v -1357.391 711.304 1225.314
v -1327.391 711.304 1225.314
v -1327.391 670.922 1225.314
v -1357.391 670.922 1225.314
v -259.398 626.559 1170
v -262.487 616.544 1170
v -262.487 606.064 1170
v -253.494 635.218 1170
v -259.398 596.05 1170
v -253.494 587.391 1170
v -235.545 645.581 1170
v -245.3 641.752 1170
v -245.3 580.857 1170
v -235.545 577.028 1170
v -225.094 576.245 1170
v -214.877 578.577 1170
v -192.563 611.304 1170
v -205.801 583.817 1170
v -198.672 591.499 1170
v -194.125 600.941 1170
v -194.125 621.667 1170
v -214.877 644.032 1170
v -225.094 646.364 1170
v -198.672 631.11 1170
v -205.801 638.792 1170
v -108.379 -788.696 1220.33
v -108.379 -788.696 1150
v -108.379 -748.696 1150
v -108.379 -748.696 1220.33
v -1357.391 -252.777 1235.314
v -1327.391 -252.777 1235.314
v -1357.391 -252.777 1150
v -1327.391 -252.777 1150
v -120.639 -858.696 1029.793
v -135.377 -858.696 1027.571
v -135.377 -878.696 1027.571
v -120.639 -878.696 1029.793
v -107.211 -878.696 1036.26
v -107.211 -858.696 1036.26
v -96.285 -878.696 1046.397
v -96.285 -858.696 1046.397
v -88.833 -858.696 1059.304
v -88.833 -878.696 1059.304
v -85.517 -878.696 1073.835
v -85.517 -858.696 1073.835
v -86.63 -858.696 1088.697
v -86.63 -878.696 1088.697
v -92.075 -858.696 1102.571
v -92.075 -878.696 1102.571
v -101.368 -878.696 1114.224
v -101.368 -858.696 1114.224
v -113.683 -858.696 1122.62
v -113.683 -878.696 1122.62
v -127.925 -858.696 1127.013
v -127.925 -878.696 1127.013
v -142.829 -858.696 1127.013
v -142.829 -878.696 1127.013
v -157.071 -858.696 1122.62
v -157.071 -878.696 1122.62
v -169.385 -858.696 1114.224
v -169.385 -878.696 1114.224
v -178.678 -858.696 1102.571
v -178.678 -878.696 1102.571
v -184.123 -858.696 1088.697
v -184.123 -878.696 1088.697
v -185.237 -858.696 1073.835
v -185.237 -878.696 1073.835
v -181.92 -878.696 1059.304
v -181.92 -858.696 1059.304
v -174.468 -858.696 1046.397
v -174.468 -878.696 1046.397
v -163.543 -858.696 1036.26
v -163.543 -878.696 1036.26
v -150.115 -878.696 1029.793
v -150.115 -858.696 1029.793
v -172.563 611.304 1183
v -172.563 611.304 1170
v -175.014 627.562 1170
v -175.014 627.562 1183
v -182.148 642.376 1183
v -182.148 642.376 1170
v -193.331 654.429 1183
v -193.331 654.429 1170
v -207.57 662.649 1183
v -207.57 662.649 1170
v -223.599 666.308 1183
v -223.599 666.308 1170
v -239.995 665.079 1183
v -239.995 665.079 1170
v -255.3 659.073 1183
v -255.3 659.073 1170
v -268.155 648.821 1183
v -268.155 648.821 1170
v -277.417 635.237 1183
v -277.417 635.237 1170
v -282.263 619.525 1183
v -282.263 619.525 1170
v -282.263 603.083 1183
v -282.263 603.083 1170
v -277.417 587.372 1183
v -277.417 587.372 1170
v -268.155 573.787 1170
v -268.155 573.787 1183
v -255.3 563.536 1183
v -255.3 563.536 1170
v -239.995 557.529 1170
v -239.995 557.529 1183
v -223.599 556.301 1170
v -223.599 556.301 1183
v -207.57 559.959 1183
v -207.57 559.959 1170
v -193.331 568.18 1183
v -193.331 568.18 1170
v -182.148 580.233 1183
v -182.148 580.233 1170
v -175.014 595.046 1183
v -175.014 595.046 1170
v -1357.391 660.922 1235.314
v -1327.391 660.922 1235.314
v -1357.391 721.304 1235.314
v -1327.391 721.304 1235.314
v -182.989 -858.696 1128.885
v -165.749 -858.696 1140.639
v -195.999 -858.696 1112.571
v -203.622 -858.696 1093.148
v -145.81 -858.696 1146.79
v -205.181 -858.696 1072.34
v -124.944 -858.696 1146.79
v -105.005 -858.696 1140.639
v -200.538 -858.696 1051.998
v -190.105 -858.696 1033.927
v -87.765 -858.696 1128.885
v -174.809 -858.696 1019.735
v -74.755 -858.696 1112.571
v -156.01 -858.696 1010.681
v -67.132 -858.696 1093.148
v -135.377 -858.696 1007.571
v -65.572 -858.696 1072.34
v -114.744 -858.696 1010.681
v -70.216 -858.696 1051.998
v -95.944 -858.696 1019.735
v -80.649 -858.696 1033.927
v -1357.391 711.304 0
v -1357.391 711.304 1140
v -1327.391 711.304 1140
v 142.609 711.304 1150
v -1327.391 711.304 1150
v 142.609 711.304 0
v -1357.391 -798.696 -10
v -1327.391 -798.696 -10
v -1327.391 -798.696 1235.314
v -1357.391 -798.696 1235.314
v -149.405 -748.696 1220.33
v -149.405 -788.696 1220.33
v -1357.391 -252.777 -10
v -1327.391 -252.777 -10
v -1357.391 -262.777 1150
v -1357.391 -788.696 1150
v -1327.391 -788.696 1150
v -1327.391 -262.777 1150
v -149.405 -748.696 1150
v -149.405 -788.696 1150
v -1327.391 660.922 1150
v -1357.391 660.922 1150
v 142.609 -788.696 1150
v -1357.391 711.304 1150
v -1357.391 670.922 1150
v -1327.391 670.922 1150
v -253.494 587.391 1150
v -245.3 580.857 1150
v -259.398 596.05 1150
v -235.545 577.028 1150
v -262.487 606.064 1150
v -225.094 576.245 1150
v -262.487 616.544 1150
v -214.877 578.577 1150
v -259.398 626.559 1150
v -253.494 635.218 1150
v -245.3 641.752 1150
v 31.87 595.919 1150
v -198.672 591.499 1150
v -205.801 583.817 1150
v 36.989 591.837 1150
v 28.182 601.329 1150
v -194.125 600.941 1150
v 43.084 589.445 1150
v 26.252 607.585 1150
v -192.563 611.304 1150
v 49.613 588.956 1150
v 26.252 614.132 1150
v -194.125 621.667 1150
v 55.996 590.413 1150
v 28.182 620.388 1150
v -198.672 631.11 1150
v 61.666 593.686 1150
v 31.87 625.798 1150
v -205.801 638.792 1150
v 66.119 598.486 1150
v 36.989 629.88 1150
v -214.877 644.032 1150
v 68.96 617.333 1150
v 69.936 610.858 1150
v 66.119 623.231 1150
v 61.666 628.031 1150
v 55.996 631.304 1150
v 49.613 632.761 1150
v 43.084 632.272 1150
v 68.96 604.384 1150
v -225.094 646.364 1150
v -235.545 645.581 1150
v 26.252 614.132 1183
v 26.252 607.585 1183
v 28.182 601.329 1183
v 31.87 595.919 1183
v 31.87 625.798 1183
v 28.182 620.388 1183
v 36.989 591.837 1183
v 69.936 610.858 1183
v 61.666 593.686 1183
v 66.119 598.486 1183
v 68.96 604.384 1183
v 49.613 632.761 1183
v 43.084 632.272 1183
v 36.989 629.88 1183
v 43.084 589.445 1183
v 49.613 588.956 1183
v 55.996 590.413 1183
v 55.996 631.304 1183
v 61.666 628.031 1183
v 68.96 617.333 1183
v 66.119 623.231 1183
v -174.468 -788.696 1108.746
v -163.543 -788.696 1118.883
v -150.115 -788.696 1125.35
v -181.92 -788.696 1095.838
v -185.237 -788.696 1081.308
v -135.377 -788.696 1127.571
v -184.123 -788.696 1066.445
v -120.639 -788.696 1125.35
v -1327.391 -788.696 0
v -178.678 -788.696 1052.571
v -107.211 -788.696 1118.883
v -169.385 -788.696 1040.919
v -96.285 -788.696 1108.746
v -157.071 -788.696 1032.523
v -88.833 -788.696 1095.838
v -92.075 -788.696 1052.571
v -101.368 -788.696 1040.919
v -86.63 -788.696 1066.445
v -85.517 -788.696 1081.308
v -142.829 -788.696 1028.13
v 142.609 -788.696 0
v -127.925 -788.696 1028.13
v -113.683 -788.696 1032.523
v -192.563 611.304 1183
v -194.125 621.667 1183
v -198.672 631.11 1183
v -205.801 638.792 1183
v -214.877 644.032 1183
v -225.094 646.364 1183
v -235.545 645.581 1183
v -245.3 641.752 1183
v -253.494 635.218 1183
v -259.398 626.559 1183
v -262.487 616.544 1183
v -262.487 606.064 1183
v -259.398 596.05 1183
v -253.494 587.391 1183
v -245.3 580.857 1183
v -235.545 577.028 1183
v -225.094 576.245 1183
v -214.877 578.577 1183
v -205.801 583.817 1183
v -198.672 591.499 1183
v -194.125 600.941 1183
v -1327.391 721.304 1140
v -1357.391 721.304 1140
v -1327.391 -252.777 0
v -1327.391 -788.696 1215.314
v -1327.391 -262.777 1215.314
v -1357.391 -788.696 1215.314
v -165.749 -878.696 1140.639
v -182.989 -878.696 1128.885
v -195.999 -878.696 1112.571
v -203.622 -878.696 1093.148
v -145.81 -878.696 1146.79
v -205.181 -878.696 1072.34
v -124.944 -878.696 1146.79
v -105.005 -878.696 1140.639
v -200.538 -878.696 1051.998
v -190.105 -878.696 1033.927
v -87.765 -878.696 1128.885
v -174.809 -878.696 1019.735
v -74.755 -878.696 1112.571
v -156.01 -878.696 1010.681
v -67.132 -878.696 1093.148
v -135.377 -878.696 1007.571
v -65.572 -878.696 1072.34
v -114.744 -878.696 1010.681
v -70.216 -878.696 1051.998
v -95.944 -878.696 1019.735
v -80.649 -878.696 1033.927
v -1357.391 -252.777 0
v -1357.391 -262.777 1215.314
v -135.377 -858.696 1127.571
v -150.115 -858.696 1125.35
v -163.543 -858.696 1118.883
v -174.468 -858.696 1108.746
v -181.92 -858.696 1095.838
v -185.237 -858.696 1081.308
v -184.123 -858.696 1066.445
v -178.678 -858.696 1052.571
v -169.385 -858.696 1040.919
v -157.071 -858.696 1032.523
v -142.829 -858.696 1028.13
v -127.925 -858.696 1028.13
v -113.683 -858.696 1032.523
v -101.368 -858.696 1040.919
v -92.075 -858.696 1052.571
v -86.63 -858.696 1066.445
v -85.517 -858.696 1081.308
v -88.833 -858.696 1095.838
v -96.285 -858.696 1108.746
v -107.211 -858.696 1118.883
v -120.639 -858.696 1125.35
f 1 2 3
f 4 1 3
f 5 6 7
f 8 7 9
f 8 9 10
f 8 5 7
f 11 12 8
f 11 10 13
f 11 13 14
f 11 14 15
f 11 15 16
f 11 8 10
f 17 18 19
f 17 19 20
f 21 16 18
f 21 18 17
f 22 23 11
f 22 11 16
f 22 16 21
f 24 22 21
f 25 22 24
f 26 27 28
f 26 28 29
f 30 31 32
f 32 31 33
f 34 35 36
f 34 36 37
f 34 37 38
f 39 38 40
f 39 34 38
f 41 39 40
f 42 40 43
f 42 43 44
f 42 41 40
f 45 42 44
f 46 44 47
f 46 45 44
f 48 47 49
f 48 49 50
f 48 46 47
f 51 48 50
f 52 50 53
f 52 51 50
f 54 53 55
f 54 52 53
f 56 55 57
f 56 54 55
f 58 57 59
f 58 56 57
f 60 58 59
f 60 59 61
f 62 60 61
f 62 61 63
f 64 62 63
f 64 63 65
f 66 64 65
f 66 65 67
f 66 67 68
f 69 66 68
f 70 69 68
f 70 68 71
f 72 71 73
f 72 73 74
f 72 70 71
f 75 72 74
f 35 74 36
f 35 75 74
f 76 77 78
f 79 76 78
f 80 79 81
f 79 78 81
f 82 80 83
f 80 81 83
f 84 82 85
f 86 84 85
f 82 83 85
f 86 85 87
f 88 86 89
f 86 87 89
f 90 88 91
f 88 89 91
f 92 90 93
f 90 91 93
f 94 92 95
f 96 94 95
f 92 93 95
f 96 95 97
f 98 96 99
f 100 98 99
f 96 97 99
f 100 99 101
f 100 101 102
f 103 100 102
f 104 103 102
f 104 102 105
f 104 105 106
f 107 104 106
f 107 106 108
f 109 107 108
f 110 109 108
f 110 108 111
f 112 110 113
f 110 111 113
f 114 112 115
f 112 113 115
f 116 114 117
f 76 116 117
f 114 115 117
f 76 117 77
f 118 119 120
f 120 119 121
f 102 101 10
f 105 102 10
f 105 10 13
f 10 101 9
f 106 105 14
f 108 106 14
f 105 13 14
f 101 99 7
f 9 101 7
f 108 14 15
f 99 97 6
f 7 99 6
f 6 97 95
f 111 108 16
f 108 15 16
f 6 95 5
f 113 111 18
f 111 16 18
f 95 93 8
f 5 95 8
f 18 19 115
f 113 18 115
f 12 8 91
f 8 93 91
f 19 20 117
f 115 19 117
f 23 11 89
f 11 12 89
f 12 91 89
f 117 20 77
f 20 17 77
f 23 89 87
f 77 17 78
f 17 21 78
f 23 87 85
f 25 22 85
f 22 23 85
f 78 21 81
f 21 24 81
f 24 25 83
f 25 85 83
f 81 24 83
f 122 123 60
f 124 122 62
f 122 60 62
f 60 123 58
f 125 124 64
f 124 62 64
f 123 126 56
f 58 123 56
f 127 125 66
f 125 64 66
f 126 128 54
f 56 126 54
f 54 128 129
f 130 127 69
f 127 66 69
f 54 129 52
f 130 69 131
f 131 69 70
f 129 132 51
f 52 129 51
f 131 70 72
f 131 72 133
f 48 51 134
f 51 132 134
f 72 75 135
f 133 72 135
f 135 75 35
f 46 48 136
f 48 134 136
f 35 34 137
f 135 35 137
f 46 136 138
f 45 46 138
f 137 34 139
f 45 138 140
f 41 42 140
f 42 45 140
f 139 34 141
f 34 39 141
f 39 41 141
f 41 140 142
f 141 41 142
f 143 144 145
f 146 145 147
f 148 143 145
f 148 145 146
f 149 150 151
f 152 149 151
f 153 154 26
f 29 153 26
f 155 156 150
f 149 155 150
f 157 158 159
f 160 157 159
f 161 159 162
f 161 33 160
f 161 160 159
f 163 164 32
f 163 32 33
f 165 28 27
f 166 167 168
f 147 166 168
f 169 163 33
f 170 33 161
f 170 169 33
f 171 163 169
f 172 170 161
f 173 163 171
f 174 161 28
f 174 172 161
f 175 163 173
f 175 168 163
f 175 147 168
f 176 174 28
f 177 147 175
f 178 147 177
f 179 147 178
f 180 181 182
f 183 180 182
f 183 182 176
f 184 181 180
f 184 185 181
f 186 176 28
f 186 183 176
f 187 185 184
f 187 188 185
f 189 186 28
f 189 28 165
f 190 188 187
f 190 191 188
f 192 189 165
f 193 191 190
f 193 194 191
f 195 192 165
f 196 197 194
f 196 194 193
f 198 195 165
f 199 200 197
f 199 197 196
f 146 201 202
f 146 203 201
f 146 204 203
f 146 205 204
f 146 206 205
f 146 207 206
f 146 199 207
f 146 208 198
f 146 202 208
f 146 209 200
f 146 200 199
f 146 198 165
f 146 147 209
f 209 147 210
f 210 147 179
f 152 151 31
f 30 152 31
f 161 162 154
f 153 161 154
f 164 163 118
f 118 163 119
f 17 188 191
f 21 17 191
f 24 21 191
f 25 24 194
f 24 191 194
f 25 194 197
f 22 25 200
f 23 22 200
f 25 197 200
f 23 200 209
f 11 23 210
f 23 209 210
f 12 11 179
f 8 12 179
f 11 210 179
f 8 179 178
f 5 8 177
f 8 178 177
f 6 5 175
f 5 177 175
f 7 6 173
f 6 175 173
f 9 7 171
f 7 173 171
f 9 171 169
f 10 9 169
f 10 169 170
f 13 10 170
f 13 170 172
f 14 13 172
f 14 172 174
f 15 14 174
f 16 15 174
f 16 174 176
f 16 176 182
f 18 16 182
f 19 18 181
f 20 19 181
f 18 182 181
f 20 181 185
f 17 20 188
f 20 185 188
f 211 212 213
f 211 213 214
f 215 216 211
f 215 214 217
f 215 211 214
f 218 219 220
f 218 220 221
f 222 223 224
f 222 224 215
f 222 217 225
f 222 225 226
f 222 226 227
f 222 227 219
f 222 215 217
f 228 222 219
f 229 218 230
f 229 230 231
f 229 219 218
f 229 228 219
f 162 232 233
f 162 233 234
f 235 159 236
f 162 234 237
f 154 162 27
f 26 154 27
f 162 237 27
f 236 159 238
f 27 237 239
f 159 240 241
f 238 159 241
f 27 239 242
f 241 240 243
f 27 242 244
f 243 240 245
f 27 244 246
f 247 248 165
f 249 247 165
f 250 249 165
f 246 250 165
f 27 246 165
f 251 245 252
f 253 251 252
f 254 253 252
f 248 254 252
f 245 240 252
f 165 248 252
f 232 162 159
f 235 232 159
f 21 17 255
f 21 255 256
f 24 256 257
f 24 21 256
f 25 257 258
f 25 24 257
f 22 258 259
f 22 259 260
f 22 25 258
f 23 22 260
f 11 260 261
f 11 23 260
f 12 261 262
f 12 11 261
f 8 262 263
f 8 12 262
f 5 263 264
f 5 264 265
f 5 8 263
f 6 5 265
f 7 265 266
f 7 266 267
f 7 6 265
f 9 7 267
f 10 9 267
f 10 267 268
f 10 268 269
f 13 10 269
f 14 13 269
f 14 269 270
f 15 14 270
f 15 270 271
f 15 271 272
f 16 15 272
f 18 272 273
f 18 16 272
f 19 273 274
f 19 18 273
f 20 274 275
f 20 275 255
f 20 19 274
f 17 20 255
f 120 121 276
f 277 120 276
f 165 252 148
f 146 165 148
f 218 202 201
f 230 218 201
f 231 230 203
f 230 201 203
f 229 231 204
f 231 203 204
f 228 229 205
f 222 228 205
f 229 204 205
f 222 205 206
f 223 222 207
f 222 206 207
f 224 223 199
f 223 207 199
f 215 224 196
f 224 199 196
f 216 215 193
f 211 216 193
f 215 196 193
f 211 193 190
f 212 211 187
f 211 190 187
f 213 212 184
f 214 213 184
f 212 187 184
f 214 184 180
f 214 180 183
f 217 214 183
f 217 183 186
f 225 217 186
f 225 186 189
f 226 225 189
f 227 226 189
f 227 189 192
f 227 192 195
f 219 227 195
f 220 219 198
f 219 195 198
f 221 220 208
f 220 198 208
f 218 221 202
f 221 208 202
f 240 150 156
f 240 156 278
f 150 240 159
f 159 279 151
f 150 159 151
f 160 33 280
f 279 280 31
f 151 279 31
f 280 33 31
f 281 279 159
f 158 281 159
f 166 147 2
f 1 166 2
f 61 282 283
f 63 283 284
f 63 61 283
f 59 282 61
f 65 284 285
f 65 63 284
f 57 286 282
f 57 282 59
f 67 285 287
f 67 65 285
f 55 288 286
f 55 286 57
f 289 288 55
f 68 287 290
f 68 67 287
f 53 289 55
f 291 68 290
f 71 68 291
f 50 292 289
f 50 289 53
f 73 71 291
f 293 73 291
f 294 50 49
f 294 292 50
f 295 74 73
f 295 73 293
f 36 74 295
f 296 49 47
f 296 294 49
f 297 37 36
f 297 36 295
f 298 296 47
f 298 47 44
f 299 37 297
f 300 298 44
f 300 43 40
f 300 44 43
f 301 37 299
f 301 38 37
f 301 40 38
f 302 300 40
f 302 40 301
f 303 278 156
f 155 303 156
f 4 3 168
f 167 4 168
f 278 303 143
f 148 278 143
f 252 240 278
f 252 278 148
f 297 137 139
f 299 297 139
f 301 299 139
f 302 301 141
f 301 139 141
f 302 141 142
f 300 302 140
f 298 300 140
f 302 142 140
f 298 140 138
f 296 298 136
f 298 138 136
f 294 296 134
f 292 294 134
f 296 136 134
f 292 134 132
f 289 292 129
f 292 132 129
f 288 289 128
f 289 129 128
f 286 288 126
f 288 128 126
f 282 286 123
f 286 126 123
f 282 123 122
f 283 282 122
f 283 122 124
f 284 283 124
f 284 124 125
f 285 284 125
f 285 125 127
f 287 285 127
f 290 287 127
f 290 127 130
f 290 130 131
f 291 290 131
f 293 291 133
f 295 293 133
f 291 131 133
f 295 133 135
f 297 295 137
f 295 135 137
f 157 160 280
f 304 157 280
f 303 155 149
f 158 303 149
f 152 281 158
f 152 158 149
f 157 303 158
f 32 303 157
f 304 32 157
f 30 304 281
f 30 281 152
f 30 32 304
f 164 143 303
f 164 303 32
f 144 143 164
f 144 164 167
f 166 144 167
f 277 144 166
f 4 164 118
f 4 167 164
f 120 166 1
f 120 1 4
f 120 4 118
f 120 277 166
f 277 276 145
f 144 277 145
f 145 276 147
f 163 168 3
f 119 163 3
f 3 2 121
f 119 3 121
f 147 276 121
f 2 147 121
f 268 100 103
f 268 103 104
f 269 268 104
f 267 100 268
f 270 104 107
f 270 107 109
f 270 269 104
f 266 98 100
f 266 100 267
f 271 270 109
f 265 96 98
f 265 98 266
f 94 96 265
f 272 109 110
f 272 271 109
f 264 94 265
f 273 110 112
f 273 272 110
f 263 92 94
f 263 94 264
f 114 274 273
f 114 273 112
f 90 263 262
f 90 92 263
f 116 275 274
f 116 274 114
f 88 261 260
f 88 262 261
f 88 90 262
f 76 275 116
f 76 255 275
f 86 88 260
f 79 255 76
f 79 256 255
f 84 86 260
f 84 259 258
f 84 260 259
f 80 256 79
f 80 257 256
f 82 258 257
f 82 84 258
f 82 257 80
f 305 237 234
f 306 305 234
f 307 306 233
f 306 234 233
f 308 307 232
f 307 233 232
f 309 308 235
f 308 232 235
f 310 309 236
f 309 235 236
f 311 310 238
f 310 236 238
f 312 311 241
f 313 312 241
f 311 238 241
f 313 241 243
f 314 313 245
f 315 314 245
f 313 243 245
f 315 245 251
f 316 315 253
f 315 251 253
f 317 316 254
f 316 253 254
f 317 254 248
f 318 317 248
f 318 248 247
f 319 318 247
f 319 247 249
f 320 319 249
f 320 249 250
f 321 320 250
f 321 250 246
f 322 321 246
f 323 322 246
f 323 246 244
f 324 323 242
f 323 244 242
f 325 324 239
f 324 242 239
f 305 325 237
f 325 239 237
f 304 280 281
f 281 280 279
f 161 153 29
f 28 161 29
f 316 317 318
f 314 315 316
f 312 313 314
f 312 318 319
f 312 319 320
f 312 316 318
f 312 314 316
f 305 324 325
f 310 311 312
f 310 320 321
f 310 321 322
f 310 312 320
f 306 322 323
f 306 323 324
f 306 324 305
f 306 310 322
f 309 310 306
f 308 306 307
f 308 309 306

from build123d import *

# Parameters (mm, degrees)
SKETCH1_W           = 1500
SKETCH1_H           = 1500
BOSS_EXTRUDE1_DEPTH = 1150
EXTRUDE_THIN2_START = -30
EXTRUDE_THIN2_DEPTH = 30
SKETCH3_W           = 41.026330883
SKETCH3_H           = 1220.330091563
BOSS_EXTRUDE2_DEPTH = 40
SKETCH4_R           = 50
BOSS_EXTRUDE3_DEPTH = 70
SKETCH5_R           = 70
SKETCH5_R_2         = 50
BOSS_EXTRUDE4_DEPTH = 20
SKETCH6_R           = 35.15798367
BOSS_EXTRUDE5_DEPTH = 20
SKETCH7_R           = 55.15798367
SKETCH7_R_2         = 35.15798367
BOSS_EXTRUDE6_DEPTH = 13
SKETCH8_R           = 21.964256975
BOSS_EXTRUDE7_DEPTH = 33


# Read off the part's stored shape, not the designer's step: Extrude-Thin2
with BuildPart() as part:
    # Sketch1 → Boss-Extrude1 (new body)
    with BuildSketch(Plane.XY):
        with Locations((-607.391304348, -38.695652174)):
            Rectangle(SKETCH1_W, SKETCH1_H)
    extrude(amount=BOSS_EXTRUDE1_DEPTH)

    # Extrude-Thin2 outline → Extrude-Thin2 (add)
    with BuildSketch(Plane.ZY.offset(1357.391304348).offset(EXTRUDE_THIN2_START)):
        Polygon((1140, 721.304347826), (1140, 711.304347826), (1225.313853743, 711.304347826), (1225.313853743, 670.922038878), (1150, 670.922038878), (1150, 660.922038878), (1235.313853743, 660.922038878), (1235.313853743, 721.304347826), align=None)
        Polygon((0, -788.695652174), (0, -252.776990358), (-10, -252.776990358), (-10, -798.695652174), (1235.313853743, -798.695652174), (1235.313853743, -252.776990358), (1150, -252.776990358), (1150, -262.776990358), (1215.313853743, -262.776990358), (1215.313853743, -788.695652174), align=None)
    extrude(amount=EXTRUDE_THIN2_DEPTH)

    # Sketch3 → Boss-Extrude2 (add)
    with BuildSketch(Plane.XZ.offset(788.695652174)):
        with Locations((-128.892214668, 610.165045781)):
            Rectangle(SKETCH3_W, SKETCH3_H)
    extrude(amount=-BOSS_EXTRUDE2_DEPTH)

    # Sketch4 → Boss-Extrude3 (add)
    with BuildSketch(Plane.XZ.offset(788.695652174)):
        with Locations(Location((-135.376748929, 1077.57144651, 0), (0, 0, 90))):
            Circle(SKETCH4_R)
    extrude(amount=BOSS_EXTRUDE3_DEPTH)

    # Sketch6 → Boss-Extrude5 (add)
    with BuildSketch(Plane.XY.offset(1150)):
        with Locations((-227.721378389, 611.304347826)):
            Circle(SKETCH6_R)
    extrude(amount=BOSS_EXTRUDE5_DEPTH)

    # Sketch8 → Boss-Extrude7 (add)
    with BuildSketch(Plane.XY.offset(1150)):
        with Locations((47.971393261, 610.858453258)):
            Circle(SKETCH8_R)
    extrude(amount=BOSS_EXTRUDE7_DEPTH)


with BuildPart() as body_2:
    # Sketch5 → Boss-Extrude4 (new body)
    with BuildSketch(Plane.XZ.offset(858.695652174)):
        with Locations(Location((-135.376748929, 1077.57144651, 0), (0, 0, 270))):
            Circle(SKETCH5_R)
        with Locations(Location((-135.376748929, 1077.57144651, 0), (0, 0, 270))):
            Circle(SKETCH5_R_2, mode=Mode.SUBTRACT)
    extrude(amount=BOSS_EXTRUDE4_DEPTH)


with BuildPart() as body_3:
    # Sketch7 → Boss-Extrude6 (new body)
    with BuildSketch(Plane.XY.offset(1170)):
        with Locations((-227.721378389, 611.304347826)):
            Circle(SKETCH7_R)
        with Locations((-227.721378389, 611.304347826)):
            Circle(SKETCH7_R_2, mode=Mode.SUBTRACT)
    extrude(amount=BOSS_EXTRUDE6_DEPTH)


solid = Compound([part.part, body_2.part, body_3.part])
